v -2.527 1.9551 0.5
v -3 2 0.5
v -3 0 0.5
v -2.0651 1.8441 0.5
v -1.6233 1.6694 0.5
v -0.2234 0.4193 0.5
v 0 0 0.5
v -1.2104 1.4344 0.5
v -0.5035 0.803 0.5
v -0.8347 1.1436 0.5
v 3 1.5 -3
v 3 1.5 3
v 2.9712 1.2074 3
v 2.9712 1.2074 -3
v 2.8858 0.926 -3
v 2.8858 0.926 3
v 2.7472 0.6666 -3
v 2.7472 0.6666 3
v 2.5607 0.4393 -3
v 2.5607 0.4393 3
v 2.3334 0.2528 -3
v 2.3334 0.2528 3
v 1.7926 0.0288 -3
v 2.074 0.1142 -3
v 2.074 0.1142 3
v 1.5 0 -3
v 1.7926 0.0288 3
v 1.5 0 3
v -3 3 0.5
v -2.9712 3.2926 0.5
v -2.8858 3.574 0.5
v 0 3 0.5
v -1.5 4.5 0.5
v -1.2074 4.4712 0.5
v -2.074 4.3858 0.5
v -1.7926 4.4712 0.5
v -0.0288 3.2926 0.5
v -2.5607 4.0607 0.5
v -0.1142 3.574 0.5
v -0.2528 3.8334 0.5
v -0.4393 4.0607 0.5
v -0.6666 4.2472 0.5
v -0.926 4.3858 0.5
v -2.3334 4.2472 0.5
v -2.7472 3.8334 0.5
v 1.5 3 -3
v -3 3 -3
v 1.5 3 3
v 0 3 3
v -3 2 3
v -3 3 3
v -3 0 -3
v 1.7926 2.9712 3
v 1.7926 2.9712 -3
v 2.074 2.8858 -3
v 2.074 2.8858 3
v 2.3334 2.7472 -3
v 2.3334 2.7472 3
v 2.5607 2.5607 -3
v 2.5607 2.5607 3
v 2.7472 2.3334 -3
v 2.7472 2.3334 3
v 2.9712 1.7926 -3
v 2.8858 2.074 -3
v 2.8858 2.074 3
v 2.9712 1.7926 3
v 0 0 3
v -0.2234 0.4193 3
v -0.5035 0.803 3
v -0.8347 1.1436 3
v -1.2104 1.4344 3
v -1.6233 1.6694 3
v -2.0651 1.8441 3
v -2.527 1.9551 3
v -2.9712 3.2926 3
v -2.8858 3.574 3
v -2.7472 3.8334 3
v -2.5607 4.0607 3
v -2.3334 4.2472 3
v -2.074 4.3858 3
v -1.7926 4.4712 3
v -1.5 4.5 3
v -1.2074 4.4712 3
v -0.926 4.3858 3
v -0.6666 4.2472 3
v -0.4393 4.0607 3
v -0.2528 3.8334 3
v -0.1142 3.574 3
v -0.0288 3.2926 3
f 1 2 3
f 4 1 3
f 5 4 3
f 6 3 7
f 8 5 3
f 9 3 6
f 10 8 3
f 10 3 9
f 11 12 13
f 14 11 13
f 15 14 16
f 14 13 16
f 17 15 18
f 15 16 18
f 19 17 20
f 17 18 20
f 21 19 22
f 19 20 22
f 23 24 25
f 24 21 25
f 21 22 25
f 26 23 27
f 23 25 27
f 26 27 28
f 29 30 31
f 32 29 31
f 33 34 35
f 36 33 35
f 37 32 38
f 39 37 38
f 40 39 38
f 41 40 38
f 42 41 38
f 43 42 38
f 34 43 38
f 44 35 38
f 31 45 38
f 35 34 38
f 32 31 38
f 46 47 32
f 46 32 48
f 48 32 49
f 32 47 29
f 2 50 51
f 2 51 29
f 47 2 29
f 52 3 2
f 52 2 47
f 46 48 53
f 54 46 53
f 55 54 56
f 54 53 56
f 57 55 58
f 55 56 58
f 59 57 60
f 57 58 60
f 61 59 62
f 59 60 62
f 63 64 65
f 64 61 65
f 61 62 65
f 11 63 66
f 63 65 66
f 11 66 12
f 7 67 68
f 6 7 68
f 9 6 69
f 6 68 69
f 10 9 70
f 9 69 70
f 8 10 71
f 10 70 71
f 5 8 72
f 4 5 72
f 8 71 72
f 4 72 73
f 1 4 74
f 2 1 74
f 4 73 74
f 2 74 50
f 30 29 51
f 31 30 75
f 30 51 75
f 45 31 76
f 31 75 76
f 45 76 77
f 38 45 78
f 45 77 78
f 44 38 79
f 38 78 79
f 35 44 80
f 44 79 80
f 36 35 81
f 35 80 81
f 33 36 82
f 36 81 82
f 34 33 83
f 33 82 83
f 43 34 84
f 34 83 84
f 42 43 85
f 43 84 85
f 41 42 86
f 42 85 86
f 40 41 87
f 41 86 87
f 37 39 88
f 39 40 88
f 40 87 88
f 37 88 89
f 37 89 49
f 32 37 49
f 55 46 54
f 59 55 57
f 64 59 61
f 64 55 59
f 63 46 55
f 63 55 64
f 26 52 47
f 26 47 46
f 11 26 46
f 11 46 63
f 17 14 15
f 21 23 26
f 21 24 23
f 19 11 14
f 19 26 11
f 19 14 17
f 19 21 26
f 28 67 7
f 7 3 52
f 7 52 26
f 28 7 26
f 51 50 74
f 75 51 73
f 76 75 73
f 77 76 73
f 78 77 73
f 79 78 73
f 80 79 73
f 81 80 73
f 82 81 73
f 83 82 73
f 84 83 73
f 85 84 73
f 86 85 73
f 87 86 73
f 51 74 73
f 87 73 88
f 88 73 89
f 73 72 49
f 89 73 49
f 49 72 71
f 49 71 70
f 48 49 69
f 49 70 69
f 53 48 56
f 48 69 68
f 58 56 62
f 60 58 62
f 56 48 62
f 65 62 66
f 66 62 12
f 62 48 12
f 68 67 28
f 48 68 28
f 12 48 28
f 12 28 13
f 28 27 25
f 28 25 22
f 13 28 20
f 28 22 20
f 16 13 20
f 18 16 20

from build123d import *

# Parameters (mm, degrees)
SKETCH1_W               = 6
SKETCH1_H               = 6
BOSS_EXTRUDE1_DEPTH     = 5
CUT_EXTRUDE1_DEPTH      = 10
CUT_EXTRUDE2_DEPTH      = 1
CUT_EXTRUDE2_DEPTH_BACK = 2.5
SKETCH4_W               = 3.5
SKETCH4_H               = 1.5
CUT_EXTRUDE3_DEPTH      = 12.5


with BuildPart() as part:
    # Sketch1 → Boss-Extrude1 (new body)
    with BuildSketch(Plane(origin=(0, 0, 0), x_dir=(1, 0, 0), z_dir=(0, 1, 0))):
        Rectangle(SKETCH1_W, SKETCH1_H)
    extrude(amount=BOSS_EXTRUDE1_DEPTH)

    # Sketch2 → Cut-Extrude1 (cut)
    with BuildSketch(Plane.XY.offset(3)):
        with BuildLine():
            ThreePointArc((-3, 3), (-1.5, 4.5), (0, 3))
            Line((0, 3), (1.5, 3))
            ThreePointArc((1.5, 3), (2.560660172, 2.560660172), (3, 1.5))
            Line((3, 1.5), (3, 5))
            Line((3, 5), (-3, 5))
            Line((-3, 5), (-3, 3))
        make_face()
        with BuildLine():
            Line((3, 0), (3, 1.5))
            ThreePointArc((3, 1.5), (2.560660172, 0.439339828), (1.5, 0))
            Line((1.5, 0), (3, 0))
        make_face()
    extrude(amount=-CUT_EXTRUDE1_DEPTH, mode=Mode.SUBTRACT)

    # Sketch3 → Cut-Extrude2 (cut, two sides)
    with BuildSketch(Plane.XY.offset(3)) as cut_extrude2_sk:
        with BuildLine():
            Line((-3, 2), (-3, 0))
            Line((-3, 0), (0, 0))
            ThreePointArc((0, 0), (-1.210432595, 1.434351108), (-3, 2))
        make_face()
    extrude(amount=CUT_EXTRUDE2_DEPTH, mode=Mode.SUBTRACT)
    extrude(cut_extrude2_sk.sketch, amount=-CUT_EXTRUDE2_DEPTH_BACK, mode=Mode.SUBTRACT)

    # Sketch4 → Cut-Extrude3 (cut)
    with BuildSketch(Plane.ZY.offset(3)):
        with Locations((-1.25, 3.75)):
            Rectangle(SKETCH4_W, SKETCH4_H)
    extrude(amount=-CUT_EXTRUDE3_DEPTH, mode=Mode.SUBTRACT)


solid = part.part
